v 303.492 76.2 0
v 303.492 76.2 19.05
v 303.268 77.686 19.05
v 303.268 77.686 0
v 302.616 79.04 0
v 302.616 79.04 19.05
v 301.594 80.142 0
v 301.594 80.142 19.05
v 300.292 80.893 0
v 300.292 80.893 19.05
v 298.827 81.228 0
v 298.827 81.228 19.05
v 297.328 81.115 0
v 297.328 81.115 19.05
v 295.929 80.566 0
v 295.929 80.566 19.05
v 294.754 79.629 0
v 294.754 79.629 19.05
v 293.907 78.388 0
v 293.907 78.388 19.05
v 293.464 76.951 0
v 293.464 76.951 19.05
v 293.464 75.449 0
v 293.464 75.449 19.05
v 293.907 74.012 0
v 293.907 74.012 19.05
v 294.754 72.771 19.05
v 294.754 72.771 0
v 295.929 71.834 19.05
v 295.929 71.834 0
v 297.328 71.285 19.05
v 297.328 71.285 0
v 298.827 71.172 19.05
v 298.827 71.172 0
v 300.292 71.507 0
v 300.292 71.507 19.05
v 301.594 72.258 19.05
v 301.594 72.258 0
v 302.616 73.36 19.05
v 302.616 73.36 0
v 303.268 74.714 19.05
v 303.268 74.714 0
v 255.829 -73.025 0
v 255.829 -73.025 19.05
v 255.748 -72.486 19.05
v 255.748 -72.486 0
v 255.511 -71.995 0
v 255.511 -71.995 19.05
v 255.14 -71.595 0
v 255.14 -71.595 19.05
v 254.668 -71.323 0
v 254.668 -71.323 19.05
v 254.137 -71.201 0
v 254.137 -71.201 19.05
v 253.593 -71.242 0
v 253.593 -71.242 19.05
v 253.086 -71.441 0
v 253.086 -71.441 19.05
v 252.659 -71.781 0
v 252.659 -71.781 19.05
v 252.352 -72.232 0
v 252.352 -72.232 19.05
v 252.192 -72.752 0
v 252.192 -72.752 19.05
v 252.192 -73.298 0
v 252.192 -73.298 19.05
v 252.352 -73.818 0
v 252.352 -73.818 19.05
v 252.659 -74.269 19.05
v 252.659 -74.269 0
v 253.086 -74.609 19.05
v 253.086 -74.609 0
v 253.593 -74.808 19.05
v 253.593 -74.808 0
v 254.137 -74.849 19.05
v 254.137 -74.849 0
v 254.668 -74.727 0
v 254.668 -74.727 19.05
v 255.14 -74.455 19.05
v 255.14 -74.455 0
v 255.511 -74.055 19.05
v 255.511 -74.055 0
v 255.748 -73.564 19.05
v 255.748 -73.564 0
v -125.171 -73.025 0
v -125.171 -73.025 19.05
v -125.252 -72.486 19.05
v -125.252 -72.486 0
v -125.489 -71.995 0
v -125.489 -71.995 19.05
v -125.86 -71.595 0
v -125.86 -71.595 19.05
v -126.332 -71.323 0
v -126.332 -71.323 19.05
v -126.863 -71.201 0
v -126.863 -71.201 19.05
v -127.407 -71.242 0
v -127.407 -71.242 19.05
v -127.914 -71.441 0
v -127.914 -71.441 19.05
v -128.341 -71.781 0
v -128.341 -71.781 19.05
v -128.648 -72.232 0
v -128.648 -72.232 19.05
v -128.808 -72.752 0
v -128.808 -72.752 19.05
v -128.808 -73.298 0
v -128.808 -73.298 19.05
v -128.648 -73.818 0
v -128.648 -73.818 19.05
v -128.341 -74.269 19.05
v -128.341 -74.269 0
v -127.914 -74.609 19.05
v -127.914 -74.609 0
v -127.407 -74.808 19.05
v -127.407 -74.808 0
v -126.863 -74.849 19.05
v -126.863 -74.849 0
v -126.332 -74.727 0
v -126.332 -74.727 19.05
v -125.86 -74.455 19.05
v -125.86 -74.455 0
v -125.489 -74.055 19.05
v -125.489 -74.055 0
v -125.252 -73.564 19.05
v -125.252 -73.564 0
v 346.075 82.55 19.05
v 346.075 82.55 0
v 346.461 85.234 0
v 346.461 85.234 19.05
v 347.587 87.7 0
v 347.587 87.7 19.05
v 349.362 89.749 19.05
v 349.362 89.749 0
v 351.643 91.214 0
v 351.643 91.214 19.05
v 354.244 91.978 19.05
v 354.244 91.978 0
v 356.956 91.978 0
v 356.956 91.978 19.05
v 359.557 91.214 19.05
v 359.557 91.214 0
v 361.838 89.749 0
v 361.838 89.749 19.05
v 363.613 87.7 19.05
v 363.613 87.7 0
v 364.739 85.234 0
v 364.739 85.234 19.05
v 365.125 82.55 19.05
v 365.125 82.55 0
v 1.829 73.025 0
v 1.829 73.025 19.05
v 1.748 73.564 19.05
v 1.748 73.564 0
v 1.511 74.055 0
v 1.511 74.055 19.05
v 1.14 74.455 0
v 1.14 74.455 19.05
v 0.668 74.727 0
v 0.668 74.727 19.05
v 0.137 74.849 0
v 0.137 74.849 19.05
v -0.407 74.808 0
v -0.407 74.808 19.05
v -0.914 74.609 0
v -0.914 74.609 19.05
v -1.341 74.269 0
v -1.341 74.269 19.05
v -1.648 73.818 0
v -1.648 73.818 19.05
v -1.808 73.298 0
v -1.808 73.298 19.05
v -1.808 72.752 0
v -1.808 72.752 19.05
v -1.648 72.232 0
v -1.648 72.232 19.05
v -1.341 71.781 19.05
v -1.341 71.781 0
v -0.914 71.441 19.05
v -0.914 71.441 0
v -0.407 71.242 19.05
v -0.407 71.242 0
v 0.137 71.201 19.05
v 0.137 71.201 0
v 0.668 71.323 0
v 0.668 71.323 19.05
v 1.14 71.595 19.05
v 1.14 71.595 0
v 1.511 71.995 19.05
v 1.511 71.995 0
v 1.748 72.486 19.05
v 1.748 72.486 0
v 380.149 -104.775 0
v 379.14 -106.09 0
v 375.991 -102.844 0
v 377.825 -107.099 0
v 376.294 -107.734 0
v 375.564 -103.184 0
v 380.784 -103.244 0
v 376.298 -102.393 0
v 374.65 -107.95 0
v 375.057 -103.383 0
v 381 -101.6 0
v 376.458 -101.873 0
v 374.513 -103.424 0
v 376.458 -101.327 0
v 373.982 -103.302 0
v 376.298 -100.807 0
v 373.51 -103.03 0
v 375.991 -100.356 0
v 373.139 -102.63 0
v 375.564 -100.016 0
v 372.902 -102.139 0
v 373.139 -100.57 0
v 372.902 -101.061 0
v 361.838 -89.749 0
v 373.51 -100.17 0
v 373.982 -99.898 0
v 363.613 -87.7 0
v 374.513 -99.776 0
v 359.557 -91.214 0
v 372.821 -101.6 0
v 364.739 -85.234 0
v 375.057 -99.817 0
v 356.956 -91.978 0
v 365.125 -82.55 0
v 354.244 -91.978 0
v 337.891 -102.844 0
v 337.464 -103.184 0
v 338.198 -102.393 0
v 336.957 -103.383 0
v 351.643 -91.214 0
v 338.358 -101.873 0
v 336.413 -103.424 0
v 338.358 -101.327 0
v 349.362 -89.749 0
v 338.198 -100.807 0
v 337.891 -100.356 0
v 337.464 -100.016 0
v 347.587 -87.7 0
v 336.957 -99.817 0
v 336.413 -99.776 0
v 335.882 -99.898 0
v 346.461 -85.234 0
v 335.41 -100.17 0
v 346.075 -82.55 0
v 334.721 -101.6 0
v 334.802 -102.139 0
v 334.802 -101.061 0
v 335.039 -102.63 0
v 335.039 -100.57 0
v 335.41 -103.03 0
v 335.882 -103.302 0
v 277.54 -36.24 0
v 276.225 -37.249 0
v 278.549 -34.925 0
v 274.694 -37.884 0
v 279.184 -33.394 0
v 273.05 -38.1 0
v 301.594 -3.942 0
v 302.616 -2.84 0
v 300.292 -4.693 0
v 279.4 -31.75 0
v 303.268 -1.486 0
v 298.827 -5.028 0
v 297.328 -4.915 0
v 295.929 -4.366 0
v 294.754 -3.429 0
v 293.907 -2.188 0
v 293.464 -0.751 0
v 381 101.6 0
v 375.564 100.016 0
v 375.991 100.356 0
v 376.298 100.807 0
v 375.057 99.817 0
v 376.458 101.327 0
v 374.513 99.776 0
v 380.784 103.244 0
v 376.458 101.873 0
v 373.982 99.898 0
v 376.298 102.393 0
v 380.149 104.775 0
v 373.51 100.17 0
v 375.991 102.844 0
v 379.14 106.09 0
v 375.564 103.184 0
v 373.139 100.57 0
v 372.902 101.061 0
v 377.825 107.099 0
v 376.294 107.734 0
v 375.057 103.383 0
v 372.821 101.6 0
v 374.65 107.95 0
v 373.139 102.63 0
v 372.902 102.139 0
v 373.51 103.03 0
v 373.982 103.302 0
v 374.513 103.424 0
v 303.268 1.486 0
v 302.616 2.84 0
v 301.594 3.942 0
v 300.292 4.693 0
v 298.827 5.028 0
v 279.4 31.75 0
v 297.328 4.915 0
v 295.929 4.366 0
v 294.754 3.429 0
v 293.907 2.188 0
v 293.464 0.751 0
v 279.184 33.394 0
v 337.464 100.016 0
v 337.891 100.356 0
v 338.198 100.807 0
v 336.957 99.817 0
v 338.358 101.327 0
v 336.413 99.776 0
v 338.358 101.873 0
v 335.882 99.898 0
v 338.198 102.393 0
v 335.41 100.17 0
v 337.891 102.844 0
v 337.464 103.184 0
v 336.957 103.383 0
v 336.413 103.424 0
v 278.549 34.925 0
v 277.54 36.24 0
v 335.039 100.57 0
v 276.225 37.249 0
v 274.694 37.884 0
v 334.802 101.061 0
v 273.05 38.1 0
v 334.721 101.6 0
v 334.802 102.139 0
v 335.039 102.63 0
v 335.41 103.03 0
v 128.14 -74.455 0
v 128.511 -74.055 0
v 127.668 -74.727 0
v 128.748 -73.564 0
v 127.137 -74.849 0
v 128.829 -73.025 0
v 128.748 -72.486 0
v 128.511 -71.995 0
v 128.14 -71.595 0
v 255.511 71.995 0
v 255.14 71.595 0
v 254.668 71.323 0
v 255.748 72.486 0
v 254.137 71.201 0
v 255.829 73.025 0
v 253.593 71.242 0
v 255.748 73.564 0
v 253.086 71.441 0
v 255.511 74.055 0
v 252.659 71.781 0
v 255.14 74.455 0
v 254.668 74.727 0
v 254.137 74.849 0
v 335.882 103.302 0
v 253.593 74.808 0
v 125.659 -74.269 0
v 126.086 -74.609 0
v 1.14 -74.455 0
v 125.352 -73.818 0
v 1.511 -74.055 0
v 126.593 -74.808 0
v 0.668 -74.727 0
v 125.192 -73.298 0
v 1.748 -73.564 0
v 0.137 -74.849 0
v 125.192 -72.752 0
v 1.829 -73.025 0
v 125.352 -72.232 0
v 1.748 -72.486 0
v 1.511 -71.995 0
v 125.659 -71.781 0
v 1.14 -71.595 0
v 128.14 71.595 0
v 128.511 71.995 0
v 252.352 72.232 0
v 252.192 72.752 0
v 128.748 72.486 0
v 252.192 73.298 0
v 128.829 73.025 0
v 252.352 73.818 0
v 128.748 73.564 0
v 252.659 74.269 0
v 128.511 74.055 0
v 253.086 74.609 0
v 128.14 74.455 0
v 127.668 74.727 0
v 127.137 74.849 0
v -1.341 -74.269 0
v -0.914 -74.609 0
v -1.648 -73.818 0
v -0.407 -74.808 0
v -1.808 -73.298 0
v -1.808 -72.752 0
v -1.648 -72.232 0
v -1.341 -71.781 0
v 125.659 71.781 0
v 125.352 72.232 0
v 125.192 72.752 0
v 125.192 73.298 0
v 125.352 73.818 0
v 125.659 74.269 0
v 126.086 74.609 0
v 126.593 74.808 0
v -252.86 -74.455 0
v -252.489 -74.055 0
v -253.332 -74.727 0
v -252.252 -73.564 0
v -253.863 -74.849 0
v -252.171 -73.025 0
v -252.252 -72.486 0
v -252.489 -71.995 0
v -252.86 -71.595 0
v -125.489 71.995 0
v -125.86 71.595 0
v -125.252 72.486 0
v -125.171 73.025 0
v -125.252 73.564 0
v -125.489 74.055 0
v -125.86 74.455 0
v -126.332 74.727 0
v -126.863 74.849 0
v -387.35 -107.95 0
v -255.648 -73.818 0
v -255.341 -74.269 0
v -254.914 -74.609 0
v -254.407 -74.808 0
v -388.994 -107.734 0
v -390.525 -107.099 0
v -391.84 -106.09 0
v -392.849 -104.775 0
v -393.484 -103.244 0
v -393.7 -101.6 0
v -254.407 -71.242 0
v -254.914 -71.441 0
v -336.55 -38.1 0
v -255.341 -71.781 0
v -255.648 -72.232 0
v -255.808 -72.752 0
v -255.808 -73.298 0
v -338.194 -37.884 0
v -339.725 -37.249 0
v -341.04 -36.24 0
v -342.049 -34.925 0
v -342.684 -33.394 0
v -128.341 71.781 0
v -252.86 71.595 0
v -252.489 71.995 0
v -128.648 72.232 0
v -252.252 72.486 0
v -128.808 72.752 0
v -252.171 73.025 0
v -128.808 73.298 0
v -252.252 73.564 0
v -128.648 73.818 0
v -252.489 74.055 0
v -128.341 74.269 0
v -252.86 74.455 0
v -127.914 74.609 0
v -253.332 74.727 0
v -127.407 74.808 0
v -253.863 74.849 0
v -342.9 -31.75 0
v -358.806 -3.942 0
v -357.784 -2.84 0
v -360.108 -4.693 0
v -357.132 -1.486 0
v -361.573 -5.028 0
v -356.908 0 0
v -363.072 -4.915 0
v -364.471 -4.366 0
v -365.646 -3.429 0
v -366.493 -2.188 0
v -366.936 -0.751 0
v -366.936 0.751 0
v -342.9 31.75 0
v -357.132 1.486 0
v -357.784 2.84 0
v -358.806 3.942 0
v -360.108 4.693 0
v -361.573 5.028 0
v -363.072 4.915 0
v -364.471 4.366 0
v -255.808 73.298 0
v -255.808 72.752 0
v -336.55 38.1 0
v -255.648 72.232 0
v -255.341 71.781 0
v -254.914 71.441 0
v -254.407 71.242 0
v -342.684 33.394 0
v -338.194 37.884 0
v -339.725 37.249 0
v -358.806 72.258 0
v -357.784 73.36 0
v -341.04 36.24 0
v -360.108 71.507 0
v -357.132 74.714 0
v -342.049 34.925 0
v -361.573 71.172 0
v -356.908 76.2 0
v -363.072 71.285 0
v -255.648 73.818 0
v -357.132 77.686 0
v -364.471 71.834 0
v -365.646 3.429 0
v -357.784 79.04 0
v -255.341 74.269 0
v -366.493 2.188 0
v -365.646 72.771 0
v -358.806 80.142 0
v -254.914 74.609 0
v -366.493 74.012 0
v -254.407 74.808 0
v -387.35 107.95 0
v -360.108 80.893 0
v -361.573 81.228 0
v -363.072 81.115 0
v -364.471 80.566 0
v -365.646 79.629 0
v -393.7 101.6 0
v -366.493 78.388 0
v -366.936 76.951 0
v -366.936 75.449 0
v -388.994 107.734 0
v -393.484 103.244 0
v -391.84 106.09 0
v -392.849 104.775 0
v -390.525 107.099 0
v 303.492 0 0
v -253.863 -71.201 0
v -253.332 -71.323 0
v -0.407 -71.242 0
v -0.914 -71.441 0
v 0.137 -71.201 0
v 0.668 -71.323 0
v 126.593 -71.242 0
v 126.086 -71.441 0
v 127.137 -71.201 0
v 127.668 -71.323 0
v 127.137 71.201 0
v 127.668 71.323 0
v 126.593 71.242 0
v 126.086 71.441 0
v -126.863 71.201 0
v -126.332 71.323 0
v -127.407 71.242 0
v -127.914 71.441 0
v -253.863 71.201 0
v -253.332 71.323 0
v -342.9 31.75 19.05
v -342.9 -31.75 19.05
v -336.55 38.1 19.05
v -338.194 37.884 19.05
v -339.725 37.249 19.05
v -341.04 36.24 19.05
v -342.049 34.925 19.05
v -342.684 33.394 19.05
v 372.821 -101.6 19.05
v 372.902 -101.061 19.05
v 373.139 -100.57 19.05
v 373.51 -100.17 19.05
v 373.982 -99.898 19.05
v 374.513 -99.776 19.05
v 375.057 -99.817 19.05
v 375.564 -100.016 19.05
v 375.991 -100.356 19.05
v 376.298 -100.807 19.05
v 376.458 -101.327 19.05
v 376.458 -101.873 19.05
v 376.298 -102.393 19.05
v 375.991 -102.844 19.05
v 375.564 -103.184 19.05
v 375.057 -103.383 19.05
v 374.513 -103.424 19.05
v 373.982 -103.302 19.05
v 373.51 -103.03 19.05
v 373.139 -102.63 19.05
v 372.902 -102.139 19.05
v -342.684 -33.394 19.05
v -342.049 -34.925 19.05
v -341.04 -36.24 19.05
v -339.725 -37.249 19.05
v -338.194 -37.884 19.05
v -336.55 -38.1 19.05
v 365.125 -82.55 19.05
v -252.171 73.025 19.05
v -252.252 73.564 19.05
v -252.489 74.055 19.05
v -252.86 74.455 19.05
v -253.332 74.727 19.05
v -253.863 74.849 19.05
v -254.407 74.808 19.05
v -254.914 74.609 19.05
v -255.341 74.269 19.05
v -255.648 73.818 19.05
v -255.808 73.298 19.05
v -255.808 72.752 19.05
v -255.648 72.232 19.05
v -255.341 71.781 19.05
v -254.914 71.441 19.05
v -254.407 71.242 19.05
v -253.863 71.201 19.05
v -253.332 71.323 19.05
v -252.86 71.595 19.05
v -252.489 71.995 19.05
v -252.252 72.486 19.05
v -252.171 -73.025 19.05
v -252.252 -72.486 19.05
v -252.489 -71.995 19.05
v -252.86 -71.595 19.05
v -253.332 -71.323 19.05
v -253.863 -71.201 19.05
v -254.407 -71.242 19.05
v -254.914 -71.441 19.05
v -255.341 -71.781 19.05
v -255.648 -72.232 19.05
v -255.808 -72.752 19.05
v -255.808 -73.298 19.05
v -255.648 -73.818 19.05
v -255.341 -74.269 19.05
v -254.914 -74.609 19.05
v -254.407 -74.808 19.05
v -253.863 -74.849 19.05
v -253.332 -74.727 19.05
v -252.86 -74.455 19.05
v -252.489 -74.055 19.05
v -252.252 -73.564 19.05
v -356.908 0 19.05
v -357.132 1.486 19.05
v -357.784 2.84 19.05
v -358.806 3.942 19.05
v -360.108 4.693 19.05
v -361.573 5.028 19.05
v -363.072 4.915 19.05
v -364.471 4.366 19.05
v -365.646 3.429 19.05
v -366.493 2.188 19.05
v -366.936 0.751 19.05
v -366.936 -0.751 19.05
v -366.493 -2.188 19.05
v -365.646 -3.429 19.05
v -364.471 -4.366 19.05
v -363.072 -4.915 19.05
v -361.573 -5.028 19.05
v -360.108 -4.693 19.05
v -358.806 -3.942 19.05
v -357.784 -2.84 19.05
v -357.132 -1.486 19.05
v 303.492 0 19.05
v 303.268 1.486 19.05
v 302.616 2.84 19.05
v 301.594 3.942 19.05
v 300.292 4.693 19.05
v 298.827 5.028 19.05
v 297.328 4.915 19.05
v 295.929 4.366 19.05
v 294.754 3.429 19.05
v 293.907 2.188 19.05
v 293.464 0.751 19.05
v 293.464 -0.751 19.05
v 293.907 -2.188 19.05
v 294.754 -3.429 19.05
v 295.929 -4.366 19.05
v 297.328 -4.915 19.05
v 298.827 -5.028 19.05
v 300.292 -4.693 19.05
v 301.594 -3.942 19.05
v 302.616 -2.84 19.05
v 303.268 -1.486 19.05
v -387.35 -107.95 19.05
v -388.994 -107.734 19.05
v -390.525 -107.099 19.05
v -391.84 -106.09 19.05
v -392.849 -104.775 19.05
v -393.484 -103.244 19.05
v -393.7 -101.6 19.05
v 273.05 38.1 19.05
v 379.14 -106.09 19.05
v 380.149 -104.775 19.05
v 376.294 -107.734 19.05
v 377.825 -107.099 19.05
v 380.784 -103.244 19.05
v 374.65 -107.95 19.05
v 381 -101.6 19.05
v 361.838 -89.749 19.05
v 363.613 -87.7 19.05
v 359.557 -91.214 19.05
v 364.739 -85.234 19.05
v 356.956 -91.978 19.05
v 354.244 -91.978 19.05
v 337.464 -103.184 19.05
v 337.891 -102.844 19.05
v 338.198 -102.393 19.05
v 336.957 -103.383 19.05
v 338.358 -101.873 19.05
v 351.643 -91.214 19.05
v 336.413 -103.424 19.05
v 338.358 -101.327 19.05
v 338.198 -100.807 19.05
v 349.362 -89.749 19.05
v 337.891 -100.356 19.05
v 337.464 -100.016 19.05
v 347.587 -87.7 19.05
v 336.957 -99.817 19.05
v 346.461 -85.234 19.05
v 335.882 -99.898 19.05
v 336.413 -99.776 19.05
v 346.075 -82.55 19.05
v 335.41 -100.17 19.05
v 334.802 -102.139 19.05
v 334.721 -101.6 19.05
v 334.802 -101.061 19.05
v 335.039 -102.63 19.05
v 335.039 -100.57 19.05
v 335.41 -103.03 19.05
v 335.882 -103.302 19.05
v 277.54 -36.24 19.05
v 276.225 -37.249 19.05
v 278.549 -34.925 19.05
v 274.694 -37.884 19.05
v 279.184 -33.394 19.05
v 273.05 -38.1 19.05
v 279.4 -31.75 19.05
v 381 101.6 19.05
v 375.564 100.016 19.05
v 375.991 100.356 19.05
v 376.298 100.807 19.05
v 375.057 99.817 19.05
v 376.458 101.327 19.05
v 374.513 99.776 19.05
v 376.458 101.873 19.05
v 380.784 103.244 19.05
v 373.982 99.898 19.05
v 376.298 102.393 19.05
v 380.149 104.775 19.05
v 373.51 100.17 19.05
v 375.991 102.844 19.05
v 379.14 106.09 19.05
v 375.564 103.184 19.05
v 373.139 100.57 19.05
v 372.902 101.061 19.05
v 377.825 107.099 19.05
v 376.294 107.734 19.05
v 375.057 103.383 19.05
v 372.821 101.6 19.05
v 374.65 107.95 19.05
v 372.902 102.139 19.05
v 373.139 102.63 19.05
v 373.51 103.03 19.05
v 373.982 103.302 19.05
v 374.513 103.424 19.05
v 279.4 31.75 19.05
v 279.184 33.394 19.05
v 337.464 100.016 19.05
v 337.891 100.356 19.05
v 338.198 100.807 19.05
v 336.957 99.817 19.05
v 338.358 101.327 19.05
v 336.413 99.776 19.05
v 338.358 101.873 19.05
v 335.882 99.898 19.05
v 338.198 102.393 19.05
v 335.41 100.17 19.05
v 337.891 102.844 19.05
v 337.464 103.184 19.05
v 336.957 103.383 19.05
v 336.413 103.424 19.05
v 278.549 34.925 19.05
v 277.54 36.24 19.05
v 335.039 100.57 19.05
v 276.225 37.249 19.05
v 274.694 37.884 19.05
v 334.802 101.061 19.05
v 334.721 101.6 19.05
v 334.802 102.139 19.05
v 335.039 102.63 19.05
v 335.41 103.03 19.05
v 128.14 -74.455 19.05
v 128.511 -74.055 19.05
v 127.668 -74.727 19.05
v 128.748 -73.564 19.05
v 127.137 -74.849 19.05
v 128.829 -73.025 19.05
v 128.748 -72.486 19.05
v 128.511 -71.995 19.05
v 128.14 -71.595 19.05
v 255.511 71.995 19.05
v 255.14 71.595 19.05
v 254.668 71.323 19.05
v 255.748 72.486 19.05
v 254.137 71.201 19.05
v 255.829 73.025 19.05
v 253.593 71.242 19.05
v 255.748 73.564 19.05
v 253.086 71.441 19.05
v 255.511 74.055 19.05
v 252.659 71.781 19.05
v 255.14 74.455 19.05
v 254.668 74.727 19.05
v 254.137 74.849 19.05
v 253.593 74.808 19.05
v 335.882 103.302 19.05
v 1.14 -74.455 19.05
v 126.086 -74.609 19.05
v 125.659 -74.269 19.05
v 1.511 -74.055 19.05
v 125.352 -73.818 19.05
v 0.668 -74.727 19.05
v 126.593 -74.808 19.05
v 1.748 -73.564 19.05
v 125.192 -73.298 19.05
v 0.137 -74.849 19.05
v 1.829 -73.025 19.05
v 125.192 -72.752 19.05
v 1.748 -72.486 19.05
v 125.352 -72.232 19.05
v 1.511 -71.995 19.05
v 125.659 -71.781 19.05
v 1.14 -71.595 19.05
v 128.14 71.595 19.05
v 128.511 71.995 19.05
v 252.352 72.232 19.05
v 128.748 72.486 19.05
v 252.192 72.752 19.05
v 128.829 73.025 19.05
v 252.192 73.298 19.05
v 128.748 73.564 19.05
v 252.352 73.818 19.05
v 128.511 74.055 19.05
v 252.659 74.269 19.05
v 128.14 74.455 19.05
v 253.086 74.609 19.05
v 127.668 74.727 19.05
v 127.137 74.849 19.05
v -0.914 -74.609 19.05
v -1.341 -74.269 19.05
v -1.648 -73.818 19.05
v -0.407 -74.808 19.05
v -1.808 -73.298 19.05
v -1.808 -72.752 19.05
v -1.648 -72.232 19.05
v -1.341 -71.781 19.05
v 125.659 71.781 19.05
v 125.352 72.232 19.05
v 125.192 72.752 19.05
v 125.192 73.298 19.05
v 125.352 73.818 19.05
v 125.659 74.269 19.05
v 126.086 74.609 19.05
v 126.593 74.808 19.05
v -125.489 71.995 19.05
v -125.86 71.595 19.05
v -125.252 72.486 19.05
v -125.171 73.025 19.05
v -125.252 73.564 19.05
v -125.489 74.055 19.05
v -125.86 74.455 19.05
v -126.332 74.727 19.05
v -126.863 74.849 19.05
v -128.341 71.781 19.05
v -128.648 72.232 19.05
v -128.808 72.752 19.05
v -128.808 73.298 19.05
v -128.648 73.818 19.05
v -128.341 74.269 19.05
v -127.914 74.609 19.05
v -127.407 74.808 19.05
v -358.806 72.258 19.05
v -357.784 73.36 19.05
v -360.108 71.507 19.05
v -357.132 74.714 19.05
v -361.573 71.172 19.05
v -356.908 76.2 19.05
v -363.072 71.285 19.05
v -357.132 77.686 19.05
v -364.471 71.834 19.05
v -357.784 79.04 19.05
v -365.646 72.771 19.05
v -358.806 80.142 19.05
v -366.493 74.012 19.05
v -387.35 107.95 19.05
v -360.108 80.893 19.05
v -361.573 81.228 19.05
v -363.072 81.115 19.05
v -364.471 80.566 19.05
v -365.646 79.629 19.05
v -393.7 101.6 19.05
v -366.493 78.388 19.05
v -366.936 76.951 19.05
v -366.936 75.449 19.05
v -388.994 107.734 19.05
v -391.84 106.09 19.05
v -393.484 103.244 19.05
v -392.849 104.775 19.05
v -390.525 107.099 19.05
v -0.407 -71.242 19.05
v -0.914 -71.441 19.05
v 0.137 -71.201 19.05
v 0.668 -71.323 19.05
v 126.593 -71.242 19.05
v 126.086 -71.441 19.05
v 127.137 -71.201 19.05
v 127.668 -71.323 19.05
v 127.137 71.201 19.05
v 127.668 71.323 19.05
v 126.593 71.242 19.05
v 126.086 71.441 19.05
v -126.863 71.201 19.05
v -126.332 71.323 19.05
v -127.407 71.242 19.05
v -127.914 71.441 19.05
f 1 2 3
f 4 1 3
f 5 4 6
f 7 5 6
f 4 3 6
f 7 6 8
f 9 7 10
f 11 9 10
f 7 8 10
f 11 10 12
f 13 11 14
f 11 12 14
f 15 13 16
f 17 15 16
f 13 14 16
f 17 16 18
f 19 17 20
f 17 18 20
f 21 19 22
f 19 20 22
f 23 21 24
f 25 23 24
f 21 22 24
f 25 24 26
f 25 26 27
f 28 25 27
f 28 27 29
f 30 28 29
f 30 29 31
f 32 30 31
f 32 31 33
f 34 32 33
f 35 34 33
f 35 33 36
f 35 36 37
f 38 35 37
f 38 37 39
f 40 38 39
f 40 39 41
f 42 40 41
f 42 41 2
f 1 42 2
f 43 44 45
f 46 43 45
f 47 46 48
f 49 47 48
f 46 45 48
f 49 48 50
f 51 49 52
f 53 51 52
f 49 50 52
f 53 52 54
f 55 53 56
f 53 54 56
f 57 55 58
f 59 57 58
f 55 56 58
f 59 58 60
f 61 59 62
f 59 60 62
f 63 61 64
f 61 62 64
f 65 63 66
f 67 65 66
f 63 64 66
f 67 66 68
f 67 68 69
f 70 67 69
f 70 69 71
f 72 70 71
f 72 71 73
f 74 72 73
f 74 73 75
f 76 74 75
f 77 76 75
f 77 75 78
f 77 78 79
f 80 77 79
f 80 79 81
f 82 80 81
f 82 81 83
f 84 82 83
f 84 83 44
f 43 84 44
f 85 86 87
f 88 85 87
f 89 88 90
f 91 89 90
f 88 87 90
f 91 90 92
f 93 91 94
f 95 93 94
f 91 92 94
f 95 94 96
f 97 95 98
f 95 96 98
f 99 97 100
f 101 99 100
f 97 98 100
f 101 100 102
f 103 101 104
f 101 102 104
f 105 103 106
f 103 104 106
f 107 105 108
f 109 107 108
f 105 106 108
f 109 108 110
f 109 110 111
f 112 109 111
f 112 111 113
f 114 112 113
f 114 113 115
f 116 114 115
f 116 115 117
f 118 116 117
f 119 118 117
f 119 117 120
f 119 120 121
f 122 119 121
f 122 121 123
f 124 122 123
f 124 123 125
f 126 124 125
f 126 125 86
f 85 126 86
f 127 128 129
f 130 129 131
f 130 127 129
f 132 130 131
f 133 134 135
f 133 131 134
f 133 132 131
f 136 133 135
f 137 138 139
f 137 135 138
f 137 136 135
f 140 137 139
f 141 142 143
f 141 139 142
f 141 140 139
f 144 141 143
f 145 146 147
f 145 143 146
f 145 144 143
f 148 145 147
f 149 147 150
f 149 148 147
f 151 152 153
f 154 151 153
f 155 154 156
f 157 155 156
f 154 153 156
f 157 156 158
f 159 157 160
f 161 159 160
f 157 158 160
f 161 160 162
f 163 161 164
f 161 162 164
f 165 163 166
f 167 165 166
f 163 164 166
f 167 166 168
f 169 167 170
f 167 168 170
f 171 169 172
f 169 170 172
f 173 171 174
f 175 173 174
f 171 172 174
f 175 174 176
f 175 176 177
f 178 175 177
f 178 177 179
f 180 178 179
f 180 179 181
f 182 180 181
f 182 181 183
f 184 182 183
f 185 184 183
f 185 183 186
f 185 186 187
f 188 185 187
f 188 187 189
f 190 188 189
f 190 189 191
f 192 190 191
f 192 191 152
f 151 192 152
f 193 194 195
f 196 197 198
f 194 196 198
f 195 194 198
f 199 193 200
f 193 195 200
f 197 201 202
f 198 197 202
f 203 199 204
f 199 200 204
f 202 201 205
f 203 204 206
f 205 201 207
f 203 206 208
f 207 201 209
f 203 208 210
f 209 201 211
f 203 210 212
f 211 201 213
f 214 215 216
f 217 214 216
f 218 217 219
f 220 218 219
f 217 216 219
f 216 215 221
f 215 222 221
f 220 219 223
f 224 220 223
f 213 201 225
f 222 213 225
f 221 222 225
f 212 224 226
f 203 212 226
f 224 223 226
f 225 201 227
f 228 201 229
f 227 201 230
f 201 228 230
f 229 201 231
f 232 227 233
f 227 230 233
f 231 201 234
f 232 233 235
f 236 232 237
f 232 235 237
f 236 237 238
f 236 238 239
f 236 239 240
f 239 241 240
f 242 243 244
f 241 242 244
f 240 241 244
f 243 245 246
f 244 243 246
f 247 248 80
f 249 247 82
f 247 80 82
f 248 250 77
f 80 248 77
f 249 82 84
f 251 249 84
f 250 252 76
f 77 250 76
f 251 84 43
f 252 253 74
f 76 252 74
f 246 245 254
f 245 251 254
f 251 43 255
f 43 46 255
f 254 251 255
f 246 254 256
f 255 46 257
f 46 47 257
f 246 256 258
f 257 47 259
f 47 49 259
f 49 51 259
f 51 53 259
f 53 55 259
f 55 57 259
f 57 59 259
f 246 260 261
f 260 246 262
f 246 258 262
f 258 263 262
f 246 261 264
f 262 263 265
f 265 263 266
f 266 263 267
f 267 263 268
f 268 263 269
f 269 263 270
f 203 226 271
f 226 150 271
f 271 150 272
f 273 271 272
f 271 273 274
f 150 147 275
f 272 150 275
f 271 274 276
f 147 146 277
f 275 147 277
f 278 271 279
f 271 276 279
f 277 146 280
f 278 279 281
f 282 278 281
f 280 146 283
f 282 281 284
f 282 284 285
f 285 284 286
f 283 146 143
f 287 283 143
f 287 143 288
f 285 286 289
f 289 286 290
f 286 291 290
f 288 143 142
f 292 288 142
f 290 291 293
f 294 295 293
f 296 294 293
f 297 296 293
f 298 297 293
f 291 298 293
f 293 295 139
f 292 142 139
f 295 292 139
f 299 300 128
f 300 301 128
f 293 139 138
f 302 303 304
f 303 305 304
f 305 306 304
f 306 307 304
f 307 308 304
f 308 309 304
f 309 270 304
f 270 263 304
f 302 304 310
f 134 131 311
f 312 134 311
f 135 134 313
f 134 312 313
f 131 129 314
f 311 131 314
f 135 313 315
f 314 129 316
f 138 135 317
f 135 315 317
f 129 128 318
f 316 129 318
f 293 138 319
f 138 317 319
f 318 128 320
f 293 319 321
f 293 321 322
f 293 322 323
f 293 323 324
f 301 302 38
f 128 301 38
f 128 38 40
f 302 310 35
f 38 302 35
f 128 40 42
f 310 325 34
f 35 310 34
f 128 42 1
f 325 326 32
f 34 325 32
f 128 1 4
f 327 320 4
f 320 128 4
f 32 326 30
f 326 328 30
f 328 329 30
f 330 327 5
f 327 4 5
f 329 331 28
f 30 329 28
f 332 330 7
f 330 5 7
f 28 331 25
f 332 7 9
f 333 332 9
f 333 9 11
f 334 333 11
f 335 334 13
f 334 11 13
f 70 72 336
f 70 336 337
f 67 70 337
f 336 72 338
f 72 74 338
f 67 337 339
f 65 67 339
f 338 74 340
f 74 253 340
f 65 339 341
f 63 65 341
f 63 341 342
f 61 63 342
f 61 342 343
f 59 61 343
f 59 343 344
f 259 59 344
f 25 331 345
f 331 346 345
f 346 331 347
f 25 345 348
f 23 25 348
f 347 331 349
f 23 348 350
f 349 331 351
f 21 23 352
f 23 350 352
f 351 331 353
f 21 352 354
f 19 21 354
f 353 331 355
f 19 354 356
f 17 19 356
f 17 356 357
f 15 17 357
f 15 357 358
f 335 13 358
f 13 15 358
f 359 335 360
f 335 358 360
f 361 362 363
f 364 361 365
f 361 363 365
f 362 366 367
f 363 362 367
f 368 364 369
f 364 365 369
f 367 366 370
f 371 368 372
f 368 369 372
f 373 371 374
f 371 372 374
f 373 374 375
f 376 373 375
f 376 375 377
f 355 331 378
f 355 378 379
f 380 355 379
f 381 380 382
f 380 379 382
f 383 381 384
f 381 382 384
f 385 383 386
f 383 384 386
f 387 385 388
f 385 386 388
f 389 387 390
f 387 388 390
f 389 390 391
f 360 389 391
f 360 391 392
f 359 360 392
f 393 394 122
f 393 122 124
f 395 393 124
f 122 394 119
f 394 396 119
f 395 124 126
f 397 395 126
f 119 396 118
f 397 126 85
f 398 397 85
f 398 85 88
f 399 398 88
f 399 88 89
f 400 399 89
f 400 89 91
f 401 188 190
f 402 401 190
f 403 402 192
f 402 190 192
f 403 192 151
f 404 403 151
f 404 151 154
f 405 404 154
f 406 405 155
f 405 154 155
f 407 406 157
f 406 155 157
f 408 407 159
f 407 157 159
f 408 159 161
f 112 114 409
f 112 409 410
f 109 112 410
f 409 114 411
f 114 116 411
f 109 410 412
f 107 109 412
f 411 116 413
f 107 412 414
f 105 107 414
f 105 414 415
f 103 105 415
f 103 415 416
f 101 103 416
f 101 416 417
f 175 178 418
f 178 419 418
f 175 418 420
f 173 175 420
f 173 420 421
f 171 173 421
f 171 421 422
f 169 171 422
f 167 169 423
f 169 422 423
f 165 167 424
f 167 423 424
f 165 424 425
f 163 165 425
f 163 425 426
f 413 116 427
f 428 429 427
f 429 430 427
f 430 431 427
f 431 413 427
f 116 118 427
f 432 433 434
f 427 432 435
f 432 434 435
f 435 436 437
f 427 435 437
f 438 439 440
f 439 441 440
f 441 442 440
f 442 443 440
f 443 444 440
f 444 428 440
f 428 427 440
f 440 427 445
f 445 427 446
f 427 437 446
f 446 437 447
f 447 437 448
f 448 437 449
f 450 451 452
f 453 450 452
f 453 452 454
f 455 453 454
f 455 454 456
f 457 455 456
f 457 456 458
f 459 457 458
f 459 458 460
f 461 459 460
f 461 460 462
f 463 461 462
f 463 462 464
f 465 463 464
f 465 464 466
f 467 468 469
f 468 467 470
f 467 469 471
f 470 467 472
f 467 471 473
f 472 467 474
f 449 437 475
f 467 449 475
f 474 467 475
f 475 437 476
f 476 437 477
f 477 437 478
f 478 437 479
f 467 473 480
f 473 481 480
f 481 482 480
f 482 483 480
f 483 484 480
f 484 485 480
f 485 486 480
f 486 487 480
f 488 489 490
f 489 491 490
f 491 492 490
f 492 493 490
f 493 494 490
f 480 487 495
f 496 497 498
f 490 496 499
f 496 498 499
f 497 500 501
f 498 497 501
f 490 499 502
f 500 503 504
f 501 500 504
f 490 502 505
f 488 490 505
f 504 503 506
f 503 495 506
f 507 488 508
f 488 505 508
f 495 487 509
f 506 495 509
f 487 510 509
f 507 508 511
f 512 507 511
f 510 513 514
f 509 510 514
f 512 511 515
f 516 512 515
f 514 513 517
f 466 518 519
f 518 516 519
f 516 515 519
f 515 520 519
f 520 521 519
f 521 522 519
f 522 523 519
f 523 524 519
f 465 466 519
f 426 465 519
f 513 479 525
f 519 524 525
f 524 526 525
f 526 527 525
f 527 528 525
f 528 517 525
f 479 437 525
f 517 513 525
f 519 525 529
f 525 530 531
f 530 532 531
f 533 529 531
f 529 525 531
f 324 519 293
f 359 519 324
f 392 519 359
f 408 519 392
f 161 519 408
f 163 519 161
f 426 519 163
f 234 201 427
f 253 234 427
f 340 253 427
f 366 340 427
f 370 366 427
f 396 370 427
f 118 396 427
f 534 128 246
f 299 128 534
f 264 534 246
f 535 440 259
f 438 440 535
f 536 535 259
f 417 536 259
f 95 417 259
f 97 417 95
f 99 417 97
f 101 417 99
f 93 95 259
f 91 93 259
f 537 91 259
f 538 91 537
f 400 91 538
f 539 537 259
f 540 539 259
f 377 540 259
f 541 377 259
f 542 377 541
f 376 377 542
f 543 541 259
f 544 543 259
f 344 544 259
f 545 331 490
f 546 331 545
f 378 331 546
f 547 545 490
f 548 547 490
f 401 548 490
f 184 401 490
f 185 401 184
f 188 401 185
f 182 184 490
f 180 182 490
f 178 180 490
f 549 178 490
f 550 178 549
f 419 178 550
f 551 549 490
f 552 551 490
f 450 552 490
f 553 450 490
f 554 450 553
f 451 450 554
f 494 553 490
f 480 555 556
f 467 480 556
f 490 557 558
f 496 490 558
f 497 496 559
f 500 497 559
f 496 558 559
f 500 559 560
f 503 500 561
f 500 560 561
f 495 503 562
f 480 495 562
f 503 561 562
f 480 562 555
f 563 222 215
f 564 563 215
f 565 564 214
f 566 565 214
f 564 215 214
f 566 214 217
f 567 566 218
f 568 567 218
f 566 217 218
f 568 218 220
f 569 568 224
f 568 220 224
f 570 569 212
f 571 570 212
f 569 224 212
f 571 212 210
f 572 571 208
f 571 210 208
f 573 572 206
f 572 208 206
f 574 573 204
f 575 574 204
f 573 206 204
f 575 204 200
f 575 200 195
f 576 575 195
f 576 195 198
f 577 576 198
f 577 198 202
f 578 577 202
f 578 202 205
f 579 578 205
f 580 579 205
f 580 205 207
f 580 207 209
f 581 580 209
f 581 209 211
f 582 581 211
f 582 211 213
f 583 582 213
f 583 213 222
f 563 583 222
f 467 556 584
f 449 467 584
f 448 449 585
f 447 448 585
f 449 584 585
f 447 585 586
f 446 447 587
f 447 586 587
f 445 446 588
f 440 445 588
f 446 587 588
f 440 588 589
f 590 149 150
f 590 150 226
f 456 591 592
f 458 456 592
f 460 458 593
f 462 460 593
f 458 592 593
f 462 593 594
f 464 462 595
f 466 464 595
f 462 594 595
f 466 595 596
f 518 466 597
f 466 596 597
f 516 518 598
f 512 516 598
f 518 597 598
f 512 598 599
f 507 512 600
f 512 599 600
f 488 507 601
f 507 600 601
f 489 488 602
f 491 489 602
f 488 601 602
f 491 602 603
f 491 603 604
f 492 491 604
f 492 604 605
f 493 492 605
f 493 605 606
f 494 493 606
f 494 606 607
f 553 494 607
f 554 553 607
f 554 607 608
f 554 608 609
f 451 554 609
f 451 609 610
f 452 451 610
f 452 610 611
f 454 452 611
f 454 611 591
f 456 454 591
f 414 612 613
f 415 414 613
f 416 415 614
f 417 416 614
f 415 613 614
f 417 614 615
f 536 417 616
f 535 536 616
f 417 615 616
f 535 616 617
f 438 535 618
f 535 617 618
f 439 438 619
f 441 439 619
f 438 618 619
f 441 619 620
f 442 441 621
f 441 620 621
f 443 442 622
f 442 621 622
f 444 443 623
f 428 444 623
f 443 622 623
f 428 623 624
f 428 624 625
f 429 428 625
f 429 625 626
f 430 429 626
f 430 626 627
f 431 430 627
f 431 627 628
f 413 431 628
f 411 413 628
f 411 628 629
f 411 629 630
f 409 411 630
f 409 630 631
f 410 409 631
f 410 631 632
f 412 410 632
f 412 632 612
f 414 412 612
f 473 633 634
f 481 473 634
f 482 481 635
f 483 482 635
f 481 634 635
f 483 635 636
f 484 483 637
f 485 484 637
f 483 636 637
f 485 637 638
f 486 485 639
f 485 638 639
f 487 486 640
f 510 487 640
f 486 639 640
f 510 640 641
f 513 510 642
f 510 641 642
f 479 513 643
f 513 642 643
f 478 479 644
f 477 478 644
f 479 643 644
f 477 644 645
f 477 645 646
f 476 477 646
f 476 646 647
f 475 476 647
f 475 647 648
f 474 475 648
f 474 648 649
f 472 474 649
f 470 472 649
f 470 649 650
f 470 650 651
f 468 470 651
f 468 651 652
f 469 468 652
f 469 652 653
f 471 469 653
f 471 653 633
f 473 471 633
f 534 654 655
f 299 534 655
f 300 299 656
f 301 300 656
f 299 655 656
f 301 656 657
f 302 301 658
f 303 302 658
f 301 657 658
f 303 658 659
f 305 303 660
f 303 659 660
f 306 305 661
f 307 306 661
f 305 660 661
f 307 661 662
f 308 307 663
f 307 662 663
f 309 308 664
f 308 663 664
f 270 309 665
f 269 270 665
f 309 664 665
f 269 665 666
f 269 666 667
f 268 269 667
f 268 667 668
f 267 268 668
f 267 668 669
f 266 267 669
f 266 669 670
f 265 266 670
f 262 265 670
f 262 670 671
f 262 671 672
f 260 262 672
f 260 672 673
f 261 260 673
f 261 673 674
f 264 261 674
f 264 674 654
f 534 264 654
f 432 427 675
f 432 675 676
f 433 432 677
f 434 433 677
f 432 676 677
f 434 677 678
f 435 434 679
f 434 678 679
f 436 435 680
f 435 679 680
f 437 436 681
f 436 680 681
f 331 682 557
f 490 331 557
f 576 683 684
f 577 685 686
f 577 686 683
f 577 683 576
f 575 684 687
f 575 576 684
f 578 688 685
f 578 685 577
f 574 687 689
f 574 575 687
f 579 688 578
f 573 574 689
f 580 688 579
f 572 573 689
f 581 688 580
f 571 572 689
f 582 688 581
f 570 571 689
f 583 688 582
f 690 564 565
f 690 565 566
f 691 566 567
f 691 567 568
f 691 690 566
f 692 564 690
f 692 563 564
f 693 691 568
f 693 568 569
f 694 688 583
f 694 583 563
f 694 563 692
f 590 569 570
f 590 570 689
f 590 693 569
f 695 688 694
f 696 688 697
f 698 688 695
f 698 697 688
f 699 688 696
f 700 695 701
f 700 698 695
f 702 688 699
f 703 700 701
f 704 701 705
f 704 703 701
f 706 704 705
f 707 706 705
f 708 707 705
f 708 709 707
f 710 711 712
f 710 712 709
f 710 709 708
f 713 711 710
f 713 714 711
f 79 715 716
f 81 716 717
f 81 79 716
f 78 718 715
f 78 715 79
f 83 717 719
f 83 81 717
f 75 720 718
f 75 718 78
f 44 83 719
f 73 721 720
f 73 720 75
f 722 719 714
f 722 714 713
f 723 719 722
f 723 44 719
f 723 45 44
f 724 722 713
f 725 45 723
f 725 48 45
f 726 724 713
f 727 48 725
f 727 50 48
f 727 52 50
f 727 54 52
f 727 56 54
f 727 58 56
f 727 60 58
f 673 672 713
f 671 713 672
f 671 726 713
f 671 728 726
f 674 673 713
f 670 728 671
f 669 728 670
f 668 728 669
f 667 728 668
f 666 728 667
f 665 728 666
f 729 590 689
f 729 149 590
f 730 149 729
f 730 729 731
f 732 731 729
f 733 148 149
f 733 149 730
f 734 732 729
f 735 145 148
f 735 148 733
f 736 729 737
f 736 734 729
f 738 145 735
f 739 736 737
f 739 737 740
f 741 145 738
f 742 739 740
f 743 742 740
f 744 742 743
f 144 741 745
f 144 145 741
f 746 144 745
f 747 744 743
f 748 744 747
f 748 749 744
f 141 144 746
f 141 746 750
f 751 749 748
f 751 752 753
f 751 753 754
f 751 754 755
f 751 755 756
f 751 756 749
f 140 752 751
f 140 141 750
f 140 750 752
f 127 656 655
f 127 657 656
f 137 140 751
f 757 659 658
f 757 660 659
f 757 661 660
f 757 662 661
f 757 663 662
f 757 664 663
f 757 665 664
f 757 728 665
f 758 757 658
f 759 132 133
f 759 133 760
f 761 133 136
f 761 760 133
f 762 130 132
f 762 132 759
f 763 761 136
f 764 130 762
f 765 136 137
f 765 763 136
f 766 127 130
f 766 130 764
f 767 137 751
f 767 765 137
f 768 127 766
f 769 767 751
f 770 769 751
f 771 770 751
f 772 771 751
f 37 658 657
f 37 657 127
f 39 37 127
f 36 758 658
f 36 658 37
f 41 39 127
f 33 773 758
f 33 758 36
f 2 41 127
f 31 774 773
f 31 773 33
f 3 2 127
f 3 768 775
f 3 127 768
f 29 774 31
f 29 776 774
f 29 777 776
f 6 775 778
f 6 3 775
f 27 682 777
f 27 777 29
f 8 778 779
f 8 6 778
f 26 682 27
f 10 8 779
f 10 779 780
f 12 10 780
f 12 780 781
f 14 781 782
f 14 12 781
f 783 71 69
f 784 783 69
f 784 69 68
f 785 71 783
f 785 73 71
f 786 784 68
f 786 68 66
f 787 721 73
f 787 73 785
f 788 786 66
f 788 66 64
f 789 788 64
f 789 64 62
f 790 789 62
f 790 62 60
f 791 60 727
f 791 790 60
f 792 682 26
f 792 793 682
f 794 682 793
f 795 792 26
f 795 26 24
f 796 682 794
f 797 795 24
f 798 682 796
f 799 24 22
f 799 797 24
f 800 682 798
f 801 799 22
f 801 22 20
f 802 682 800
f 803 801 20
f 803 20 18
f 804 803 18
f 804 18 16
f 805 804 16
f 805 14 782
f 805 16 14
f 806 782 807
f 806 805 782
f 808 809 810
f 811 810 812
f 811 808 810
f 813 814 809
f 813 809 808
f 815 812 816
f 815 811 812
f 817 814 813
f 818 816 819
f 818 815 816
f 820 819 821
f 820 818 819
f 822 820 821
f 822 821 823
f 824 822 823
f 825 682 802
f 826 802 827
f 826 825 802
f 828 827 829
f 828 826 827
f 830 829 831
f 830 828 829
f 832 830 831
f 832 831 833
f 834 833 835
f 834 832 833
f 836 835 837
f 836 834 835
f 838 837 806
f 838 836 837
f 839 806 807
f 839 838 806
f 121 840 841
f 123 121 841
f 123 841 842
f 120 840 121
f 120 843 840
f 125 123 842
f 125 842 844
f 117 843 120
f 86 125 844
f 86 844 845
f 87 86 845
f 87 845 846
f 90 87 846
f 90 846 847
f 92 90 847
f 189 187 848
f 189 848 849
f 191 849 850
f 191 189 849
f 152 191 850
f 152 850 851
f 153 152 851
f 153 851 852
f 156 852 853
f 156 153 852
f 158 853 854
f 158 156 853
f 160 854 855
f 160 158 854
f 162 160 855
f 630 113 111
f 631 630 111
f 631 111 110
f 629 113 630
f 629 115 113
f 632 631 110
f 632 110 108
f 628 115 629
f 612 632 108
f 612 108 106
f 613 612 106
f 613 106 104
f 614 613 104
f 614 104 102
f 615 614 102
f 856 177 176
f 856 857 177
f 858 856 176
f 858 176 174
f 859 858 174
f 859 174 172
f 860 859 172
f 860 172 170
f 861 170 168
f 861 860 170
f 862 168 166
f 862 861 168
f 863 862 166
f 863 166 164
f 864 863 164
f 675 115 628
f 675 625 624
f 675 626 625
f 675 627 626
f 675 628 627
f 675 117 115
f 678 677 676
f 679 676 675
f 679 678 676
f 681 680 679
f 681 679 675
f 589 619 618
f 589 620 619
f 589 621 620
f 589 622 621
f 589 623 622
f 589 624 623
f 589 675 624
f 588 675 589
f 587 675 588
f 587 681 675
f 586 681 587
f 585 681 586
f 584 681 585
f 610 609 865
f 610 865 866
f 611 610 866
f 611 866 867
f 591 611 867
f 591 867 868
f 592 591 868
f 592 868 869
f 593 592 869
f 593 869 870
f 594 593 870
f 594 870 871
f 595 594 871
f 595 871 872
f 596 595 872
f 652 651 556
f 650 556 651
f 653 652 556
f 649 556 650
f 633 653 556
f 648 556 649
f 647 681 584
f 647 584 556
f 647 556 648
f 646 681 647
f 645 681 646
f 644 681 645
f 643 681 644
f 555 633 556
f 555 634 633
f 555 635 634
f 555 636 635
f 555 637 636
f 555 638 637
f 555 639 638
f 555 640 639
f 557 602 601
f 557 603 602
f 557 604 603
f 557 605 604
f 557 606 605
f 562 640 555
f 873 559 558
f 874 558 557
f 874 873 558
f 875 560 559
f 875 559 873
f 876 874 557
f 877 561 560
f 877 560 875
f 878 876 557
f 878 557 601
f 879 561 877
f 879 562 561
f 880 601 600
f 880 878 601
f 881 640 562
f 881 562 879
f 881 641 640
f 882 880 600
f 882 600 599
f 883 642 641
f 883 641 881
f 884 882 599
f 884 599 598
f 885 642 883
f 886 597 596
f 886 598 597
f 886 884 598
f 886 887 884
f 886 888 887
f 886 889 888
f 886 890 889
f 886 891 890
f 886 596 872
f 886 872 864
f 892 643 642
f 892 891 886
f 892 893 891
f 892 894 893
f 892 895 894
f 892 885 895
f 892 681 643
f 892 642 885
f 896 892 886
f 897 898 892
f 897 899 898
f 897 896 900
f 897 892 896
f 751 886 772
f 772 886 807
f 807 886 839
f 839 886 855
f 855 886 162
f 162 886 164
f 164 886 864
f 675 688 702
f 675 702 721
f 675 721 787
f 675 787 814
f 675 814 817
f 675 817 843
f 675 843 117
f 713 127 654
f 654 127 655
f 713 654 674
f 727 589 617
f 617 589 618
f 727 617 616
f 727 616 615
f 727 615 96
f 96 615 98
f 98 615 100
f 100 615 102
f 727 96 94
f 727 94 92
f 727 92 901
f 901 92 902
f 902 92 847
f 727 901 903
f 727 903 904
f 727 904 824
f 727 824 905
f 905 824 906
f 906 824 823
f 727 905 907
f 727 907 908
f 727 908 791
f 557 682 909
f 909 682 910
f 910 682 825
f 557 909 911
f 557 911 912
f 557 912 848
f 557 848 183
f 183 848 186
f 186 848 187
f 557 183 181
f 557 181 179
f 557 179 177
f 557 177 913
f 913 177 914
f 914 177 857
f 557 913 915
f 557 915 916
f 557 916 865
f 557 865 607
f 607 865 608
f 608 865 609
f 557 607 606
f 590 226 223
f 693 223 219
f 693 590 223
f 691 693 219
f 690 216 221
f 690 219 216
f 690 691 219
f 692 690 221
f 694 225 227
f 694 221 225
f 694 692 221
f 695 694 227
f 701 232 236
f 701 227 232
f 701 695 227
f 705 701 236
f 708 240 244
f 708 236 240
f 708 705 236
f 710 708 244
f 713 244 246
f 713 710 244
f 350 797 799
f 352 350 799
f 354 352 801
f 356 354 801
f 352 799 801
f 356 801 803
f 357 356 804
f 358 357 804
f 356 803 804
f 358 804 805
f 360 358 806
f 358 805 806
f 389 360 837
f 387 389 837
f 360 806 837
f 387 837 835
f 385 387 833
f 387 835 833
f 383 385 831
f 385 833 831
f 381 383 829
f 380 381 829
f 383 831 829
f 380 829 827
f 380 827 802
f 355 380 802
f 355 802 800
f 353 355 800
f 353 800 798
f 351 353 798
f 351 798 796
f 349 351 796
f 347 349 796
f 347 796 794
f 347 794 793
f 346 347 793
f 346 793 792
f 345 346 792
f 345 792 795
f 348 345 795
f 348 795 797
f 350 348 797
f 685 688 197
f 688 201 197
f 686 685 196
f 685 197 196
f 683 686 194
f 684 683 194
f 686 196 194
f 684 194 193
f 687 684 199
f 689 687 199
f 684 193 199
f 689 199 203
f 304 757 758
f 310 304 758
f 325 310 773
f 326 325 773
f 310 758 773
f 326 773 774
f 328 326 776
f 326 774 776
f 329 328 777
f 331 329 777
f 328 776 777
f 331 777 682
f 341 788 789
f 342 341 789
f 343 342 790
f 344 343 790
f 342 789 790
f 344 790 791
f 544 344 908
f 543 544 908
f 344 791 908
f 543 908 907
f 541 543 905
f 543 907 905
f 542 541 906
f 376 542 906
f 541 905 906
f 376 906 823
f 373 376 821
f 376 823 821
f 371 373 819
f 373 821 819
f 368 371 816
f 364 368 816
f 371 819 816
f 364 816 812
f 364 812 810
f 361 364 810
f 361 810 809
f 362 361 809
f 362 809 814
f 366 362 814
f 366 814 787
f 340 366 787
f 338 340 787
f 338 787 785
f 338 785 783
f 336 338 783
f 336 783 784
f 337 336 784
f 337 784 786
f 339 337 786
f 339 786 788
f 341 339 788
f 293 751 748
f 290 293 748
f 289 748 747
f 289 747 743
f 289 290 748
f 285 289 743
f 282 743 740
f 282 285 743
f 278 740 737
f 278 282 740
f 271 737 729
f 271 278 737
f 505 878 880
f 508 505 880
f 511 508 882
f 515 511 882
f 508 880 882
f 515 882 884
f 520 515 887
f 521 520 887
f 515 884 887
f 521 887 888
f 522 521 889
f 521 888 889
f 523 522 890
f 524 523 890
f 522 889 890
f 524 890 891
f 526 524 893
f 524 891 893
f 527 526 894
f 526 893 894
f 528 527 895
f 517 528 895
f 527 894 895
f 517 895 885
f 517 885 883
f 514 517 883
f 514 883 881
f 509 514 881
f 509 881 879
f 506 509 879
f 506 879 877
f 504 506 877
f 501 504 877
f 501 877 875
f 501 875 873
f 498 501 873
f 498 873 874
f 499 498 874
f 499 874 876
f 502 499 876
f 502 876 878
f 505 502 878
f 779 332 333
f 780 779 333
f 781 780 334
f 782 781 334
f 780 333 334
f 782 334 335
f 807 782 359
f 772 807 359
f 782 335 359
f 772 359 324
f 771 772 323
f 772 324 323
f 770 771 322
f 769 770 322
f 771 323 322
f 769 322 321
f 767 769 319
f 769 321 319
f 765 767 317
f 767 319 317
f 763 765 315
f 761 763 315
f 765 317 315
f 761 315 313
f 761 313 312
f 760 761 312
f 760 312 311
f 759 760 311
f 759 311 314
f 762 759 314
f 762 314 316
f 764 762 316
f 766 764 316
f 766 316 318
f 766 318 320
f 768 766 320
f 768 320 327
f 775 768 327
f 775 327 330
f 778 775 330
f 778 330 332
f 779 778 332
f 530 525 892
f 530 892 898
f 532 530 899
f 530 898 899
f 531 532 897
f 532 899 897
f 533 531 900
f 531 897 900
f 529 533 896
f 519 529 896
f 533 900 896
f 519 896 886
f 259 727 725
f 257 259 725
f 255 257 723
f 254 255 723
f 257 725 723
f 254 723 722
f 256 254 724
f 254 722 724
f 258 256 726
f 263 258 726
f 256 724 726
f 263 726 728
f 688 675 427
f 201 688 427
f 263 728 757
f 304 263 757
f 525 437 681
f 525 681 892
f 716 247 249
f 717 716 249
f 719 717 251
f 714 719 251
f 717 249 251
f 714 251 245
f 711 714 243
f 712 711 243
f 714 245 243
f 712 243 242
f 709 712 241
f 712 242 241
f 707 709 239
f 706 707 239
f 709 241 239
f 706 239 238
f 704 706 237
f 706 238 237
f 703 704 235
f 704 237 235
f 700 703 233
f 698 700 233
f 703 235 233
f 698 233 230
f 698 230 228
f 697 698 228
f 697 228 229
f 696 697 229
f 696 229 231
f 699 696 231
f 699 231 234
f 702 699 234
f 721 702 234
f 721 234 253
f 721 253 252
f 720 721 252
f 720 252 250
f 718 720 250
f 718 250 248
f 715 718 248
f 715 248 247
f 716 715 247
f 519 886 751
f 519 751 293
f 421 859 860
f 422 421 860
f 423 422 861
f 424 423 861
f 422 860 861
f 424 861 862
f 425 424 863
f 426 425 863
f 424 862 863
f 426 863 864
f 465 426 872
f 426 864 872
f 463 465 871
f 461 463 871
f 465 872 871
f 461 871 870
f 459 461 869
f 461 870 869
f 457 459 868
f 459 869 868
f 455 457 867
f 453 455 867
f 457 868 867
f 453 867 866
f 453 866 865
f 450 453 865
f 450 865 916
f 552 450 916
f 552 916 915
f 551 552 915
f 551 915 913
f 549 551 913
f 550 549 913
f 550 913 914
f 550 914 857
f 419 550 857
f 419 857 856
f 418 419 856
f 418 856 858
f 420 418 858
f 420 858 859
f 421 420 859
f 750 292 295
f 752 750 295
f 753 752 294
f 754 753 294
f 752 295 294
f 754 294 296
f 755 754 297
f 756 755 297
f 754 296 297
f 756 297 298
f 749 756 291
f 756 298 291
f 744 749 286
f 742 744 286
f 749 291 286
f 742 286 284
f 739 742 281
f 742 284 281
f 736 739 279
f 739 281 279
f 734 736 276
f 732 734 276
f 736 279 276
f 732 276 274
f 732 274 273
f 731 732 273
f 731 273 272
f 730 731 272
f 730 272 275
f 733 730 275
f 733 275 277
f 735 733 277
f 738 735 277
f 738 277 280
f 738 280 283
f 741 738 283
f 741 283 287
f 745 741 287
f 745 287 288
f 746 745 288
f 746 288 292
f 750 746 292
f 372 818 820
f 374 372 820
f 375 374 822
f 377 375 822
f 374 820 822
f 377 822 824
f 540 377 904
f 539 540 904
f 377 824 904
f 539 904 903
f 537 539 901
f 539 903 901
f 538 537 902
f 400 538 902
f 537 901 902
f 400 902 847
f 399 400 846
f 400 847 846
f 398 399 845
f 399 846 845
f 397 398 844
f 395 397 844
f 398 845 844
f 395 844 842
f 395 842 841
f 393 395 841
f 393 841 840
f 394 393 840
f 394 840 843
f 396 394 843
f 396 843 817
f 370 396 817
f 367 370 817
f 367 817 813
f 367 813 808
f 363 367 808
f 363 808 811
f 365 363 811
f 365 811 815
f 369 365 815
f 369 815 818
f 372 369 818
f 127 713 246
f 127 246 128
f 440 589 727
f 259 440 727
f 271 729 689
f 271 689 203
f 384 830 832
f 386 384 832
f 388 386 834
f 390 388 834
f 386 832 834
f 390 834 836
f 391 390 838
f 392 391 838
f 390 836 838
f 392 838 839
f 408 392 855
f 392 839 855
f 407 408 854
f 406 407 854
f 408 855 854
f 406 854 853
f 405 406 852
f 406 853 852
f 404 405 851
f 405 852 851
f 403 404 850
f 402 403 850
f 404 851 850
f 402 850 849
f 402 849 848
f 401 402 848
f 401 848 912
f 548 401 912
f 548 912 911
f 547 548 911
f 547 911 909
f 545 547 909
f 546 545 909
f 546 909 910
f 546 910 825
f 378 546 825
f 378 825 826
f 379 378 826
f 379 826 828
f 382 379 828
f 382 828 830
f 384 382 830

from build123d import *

# Parameters (mm, degrees)
SKETCH2_W                   = 723.9
SKETCH2_H                   = 215.9
BOSS_EXTRUDE1_DEPTH         = 19.05
CUT_EXTRUDE3_DEPTH          = 409.675659906
F_27_0_144_DIAMETER_HOLE1_D = 3.6576
F_3_8_CLEARANCE_HOLE1_D     = 10.0838
SKETCH22_W                  = 19.05
SKETCH22_H                  = 215.9
BOSS_EXTRUDE2_DEPTH         = 50.8
FILLET1_R                   = 6.35
F_6_CLEARANCE_HOLE1_D       = 3.6576
CUT_EXTRUDE4_DEPTH          = 76.2


with BuildPart() as part:
    # Sketch2 → Boss-Extrude1 (new body)
    with BuildSketch(Plane.XY):
        with Locations((-31.75, 0)):
            Rectangle(SKETCH2_W, SKETCH2_H)
    extrude(amount=BOSS_EXTRUDE1_DEPTH)

    # Sketch13 → Cut-Extrude3 (cut, through all)
    with BuildSketch(Plane.XY.offset(19.05)):
        with BuildLine():
            Line((-336.55, -38.1), (273.05, -38.1))
            ThreePointArc((273.05, -38.1), (277.540128061, -36.240128061), (279.4, -31.75))
            Line((279.4, -31.75), (279.4, 31.75))
            ThreePointArc((279.4, 31.75), (277.540128061, 36.240128061), (273.05, 38.1))
            Line((273.05, 38.1), (-336.55, 38.1))
            ThreePointArc((-336.55, 38.1), (-341.040128061, 36.240128061), (-342.9, 31.75))
            Line((-342.9, 31.75), (-342.9, -31.75))
            ThreePointArc((-342.9, -31.75), (-341.040128061, -36.240128061), (-336.55, -38.1))
        make_face()
    extrude(amount=-CUT_EXTRUDE3_DEPTH, mode=Mode.SUBTRACT)

    # #27 (0.144) Diameter Hole1 (through all)
    with Locations(Plane(origin=(0, 0, 0), x_dir=(-1, 0, 0), z_dir=(0, 0, -1))):
        with Locations((0, 0), (-254, 73.025), (-127, 73.025), (0, 73.025), (127, 73.025), (254, 73.025), (-127, -73.025), (0, -73.025), (127, -73.025), (254, -73.025), (-254, -73.025)):
            Hole(F_27_0_144_DIAMETER_HOLE1_D / 2)

    # 3/8 Clearance Hole1 (through all)
    with Locations(Plane(origin=(0, 0, 0), x_dir=(-1, 0, 0), z_dir=(0, 0, -1))):
        with Locations((-298.45, 76.2), (361.95, 76.2), (361.95, 0), (-298.45, 0)):
            Hole(F_3_8_CLEARANCE_HOLE1_D / 2)

    # Sketch22 → Boss-Extrude2 (add)
    with BuildSketch(Plane(origin=(330.2, 0, 0), x_dir=(0, 0, -1), z_dir=(1, 0, 0))):
        with Locations((-9.525, 0)):
            Rectangle(SKETCH22_W, SKETCH22_H)
    extrude(amount=BOSS_EXTRUDE2_DEPTH)

    # Fillet1
    fillet1_edges = [part.edges().sort_by_distance(p)[0] for p in [
        (381, -107.95, 9.525),
        (381, 107.95, 9.525),
        (-393.7, 107.95, 9.525),
        (-393.7, -107.95, 9.525),
    ]]
    fillet(fillet1_edges, radius=FILLET1_R)

    # #6 Clearance Hole1 (through all)
    with Locations(Plane.XY.offset(19.05)):
        with Locations((336.55, -101.6), (355.6, 0), (336.55, 101.6), (374.65, -101.6), (374.65, 101.6)):
            Hole(F_6_CLEARANCE_HOLE1_D / 2)

    # Sketch25 → Cut-Extrude4 (cut)
    with BuildSketch(Plane.XY.offset(19.05)):
        with BuildLine():
            Line((346.075, -82.55), (346.075, 82.55))
            ThreePointArc((346.075, 82.55), (355.6, 92.075), (365.125, 82.55))
            Line((365.125, 82.55), (365.125, -82.55))
            ThreePointArc((365.125, -82.55), (355.6, -92.075), (346.075, -82.55))
        make_face()
    extrude(amount=-CUT_EXTRUDE4_DEPTH, mode=Mode.SUBTRACT)


solid = part.part
